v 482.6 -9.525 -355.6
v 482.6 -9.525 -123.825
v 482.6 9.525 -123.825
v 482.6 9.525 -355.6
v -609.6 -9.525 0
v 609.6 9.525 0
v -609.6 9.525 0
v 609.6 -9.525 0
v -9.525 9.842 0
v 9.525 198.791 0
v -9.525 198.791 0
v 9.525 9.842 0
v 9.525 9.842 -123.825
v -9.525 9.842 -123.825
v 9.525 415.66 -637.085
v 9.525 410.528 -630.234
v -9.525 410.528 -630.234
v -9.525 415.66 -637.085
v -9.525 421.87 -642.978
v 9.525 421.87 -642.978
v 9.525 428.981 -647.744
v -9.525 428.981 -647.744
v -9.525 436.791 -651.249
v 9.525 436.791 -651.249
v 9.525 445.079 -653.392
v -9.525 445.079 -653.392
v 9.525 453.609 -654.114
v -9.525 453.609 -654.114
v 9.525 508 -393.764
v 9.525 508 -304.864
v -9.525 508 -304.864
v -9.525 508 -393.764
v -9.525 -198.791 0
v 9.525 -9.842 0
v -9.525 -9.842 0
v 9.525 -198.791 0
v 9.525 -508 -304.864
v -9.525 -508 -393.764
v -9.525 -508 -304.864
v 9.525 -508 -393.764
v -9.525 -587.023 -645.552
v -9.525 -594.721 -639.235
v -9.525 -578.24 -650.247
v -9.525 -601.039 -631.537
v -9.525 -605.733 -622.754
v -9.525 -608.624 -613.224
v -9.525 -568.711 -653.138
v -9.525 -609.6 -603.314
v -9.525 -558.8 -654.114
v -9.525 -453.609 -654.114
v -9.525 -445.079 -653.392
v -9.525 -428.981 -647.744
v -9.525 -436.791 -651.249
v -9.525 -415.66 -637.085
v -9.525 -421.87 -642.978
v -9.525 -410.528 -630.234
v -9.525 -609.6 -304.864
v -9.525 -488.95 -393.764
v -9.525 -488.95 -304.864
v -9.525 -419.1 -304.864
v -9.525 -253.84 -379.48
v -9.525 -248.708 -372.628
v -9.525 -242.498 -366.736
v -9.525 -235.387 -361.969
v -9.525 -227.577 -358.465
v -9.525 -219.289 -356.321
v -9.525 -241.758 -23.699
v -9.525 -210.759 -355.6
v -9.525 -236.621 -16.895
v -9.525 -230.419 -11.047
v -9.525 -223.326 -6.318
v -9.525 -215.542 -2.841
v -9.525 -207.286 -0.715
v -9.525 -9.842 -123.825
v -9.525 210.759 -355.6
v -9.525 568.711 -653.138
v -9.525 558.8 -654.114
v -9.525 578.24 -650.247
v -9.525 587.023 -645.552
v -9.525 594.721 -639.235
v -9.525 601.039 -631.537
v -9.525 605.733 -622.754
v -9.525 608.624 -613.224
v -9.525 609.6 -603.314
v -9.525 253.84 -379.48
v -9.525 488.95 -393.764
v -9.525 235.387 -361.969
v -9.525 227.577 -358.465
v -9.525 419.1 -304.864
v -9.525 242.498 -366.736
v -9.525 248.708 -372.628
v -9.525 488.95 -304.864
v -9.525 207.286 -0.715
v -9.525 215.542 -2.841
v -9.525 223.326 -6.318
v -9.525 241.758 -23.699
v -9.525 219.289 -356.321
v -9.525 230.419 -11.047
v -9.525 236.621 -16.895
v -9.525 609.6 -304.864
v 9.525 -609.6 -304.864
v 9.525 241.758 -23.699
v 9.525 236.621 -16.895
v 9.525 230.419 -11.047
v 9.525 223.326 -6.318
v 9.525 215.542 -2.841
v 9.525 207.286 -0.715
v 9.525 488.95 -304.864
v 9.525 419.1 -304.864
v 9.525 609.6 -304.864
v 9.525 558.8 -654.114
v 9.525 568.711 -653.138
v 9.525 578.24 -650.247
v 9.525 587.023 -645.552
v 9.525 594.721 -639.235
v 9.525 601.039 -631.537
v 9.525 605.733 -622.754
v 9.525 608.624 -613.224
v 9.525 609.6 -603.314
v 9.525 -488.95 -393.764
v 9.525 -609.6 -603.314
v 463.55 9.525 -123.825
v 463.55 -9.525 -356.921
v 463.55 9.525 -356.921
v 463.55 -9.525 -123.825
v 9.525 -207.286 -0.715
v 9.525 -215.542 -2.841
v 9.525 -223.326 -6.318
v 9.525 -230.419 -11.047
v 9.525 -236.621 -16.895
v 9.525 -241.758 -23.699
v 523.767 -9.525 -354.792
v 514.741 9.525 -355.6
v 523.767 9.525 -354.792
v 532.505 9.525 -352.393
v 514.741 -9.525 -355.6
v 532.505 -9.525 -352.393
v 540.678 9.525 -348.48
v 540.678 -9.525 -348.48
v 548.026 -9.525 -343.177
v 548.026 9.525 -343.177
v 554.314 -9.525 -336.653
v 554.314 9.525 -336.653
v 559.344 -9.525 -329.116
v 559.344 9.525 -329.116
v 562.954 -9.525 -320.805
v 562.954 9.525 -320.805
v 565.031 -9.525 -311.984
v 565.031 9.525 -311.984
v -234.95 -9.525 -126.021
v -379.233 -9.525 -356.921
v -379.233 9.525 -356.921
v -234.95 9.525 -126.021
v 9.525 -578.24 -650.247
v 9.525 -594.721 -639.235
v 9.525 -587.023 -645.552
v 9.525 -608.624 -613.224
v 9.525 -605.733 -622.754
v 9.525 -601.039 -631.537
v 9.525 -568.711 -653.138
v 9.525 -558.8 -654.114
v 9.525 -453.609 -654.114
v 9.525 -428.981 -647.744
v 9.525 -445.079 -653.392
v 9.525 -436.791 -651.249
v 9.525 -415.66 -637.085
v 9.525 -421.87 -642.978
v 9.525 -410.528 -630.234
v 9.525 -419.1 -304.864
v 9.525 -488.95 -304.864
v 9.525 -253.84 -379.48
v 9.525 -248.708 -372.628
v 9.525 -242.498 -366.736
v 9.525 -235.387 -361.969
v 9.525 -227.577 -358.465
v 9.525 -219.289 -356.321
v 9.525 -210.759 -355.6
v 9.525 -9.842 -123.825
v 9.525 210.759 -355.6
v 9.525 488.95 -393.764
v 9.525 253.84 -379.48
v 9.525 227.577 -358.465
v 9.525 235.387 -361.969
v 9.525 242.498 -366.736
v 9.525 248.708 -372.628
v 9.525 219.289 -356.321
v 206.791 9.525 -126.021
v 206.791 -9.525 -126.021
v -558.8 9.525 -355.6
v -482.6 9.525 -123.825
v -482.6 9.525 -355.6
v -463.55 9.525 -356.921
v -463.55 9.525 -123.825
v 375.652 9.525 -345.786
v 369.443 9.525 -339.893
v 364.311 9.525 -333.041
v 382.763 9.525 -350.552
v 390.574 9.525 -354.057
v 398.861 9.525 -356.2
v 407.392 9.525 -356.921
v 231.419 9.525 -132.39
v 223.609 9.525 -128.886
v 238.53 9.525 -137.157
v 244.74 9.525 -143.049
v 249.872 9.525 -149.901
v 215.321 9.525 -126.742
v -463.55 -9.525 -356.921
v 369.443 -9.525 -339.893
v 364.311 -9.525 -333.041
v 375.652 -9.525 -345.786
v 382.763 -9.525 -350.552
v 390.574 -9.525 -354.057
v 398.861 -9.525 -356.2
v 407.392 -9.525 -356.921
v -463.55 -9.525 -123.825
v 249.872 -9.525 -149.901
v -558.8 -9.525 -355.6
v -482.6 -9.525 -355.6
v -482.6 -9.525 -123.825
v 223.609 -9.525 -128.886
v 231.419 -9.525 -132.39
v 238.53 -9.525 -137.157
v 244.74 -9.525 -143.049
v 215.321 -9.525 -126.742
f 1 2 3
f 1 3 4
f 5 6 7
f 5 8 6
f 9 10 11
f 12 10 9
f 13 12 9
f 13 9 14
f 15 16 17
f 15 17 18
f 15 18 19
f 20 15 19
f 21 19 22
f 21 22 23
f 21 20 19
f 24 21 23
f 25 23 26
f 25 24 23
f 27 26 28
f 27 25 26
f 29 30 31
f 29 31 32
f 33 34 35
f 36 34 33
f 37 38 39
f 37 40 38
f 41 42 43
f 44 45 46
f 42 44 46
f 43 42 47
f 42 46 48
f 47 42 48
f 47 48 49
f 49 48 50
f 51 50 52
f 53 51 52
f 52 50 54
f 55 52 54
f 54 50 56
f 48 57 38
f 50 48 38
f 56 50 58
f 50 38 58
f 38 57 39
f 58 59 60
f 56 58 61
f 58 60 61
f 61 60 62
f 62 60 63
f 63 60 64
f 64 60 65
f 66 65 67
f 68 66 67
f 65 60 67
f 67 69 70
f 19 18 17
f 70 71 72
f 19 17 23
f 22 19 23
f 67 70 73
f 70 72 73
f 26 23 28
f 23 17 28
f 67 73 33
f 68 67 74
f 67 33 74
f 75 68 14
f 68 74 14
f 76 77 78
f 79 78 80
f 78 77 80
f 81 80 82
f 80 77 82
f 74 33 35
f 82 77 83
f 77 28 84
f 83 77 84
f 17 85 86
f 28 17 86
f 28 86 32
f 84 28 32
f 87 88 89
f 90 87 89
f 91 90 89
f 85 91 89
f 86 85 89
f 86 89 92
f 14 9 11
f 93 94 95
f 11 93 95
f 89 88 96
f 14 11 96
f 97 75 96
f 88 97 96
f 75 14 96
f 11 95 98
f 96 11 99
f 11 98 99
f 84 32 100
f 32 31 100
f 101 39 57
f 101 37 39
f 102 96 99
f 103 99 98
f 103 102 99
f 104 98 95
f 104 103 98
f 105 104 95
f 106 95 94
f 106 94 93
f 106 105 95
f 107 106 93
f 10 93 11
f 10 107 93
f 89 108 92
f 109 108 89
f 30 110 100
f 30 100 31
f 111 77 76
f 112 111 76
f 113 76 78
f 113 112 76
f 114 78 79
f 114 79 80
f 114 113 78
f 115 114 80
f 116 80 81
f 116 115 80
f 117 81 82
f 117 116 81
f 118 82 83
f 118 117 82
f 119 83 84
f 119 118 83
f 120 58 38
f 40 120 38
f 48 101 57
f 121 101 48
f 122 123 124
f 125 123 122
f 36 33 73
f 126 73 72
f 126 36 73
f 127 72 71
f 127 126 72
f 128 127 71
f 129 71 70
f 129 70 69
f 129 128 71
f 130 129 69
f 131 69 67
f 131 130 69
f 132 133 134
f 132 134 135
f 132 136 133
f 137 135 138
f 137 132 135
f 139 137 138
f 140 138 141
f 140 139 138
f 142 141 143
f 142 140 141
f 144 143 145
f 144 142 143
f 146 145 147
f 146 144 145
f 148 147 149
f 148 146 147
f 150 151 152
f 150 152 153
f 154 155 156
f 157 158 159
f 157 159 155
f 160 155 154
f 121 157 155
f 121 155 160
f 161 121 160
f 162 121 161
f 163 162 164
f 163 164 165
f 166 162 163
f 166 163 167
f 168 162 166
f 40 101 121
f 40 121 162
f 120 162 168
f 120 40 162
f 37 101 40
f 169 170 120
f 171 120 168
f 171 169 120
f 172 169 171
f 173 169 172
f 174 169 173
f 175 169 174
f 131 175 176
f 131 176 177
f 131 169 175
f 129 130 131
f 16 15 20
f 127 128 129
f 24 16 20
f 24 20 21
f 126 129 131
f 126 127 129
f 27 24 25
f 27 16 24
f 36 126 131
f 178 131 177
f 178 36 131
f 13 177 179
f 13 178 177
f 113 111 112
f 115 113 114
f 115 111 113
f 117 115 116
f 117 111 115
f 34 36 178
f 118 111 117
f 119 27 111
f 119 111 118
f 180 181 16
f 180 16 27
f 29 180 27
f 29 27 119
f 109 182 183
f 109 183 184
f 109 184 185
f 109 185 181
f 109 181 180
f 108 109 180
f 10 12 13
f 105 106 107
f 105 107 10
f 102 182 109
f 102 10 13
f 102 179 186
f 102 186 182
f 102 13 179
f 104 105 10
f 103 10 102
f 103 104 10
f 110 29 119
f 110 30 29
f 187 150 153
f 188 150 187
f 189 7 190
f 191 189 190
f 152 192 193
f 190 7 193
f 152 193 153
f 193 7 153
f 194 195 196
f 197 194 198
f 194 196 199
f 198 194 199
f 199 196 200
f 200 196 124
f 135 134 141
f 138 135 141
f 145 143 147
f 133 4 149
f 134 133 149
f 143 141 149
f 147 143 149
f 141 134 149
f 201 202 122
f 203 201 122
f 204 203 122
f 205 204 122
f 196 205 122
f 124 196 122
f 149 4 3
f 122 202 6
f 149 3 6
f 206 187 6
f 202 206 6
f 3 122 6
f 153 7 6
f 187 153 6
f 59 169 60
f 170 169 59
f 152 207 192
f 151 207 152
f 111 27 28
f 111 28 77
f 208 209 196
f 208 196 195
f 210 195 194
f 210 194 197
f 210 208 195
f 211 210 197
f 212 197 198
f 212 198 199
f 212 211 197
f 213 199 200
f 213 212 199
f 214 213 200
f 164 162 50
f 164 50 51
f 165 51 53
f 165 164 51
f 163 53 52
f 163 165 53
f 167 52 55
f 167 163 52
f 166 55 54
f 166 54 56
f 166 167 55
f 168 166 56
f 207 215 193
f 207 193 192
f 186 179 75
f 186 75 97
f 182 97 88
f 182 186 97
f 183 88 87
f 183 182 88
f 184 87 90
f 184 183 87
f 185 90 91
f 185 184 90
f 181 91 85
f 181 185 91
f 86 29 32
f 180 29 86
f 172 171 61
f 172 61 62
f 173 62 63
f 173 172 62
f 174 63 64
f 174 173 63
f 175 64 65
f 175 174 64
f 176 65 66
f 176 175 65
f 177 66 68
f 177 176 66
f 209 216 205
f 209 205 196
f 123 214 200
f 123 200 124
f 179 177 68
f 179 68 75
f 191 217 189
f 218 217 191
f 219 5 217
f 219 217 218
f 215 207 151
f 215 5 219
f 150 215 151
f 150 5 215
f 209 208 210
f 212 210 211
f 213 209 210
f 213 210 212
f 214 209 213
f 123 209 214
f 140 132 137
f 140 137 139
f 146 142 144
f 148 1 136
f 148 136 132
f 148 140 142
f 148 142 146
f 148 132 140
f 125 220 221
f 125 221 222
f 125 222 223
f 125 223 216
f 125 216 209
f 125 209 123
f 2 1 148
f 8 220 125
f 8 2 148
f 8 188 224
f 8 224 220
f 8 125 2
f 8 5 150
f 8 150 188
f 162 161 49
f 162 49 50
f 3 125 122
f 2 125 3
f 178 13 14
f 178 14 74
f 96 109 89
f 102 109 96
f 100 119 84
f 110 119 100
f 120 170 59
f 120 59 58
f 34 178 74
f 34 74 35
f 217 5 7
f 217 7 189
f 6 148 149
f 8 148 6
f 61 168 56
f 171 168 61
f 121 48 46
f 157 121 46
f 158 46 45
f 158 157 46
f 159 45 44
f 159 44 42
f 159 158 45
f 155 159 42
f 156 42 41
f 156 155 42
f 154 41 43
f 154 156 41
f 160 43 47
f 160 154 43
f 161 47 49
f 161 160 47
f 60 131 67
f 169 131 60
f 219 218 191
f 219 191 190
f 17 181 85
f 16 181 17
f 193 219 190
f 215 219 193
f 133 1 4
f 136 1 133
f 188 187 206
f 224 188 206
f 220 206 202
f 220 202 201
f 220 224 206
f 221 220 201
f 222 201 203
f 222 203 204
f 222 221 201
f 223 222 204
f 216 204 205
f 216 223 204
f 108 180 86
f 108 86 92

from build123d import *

# Parameters (mm, degrees)
F2_DEPTH = 9.525
F3_DEPTH = 9.525


with BuildPart() as f2:
    # F1 (on Right) → F2 (new body, symmetric)
    with BuildSketch(Plane.YZ):
        with BuildLine():
            Line((-508, -304.863728), (-609.6, -304.863728))
            Line((-609.6, -304.863728), (-609.6, -603.313728))
            ThreePointArc((-609.6, -603.313728), (-594.721024, -639.234752), (-558.8, -654.113728))
            Line((-558.8, -654.113728), (-453.6089, -654.113728))
            ThreePointArc((-453.6089, -654.113728), (-428.980571, -647.744409), (-410.528057, -630.233626))
            Line((-410.528057, -630.233626), (-253.839864, -379.480101))
            ThreePointArc((-253.839864, -379.480101), (-235.387349, -361.969319), (-210.759021, -355.6))
            Line((-210.759021, -355.6), (-3.96792, -355.6))
            Line((-3.96792, -355.6), (3.96792, -355.6))
            Line((3.96792, -355.6), (210.759021, -355.6))
            ThreePointArc((210.759021, -355.6), (235.387349, -361.969319), (253.839864, -379.480101))
            Line((253.839864, -379.480101), (410.528057, -630.233626))
            ThreePointArc((410.528057, -630.233626), (428.980571, -647.744409), (453.6089, -654.113728))
            Line((453.6089, -654.113728), (558.8, -654.113728))
            ThreePointArc((558.8, -654.113728), (594.721024, -639.234752), (609.6, -603.313728))
            Line((609.6, -603.313728), (609.6, -304.863728))
            Line((609.6, -304.863728), (508, -304.863728))
            Line((508, -304.863728), (508, -393.763728))
            Line((508, -393.763728), (488.95, -393.763728))
            Line((488.95, -393.763728), (488.95, -304.863728))
            Line((488.95, -304.863728), (419.1, -304.863728))
            Line((419.1, -304.863728), (241.758068, -23.698924))
            ThreePointArc((241.758068, -23.698924), (223.325691, -6.317562), (198.790967, 0))
            Line((198.790967, 0), (9.84157, 0))
            Line((9.84157, 0), (9.84157, -123.825))
            Line((9.84157, -123.825), (0, -123.825))
            Line((0, -123.825), (-9.84157, -123.825))
            Line((-9.84157, -123.825), (-9.84157, 0))
            Line((-9.84157, 0), (-198.790967, 0))
            ThreePointArc((-198.790967, 0), (-223.325691, -6.317562), (-241.758068, -23.698924))
            Line((-241.758068, -23.698924), (-419.1, -304.863728))
            Line((-419.1, -304.863728), (-488.95, -304.863728))
            Line((-488.95, -304.863728), (-488.95, -393.763728))
            Line((-488.95, -393.763728), (-508, -393.763728))
            Line((-508, -393.763728), (-508, -304.863728))
        make_face()
    extrude(amount=F2_DEPTH, both=True)


with BuildPart() as f3:
    # F0 (on Front) → F3 (new body, symmetric)
    with BuildSketch(Plane.XZ):
        with BuildLine():
            Line((609.6, 0), (0, 0))
            Line((0, 0), (-609.6, 0))
            Line((-609.6, 0), (-558.8, -355.6))
            Line((-558.8, -355.6), (-482.6, -355.6))
            Line((-482.6, -355.6), (-482.6, -123.825))
            Line((-482.6, -123.825), (-463.55, -123.825))
            Line((-463.55, -123.825), (-463.55, -356.921328))
            Line((-463.55, -356.921328), (-379.232623, -356.921328))
            Line((-379.232623, -356.921328), (-234.95, -126.020864))
            Line((-234.95, -126.020864), (0, -126.020864))
            Line((0, -126.020864), (206.7911, -126.020864))
            ThreePointArc((206.7911, -126.020864), (231.419429, -132.390183), (249.871943, -149.900966))
            Line((249.871943, -149.900966), (364.31068, -333.041227))
            ThreePointArc((364.31068, -333.041227), (382.763194, -350.552009), (407.391523, -356.921328))
            Line((407.391523, -356.921328), (463.55, -356.921328))
            Line((463.55, -356.921328), (463.55, -123.825))
            Line((463.55, -123.825), (482.6, -123.825))
            Line((482.6, -123.825), (482.6, -355.6))
            Line((482.6, -355.6), (514.741394, -355.6))
            ThreePointArc((514.741394, -355.6), (548.025642, -343.177061), (565.030828, -311.984205))
            Line((565.030828, -311.984205), (609.6, 0))
        make_face()
    extrude(amount=F3_DEPTH, both=True)


solid = Compound([f2.part, f3.part])
